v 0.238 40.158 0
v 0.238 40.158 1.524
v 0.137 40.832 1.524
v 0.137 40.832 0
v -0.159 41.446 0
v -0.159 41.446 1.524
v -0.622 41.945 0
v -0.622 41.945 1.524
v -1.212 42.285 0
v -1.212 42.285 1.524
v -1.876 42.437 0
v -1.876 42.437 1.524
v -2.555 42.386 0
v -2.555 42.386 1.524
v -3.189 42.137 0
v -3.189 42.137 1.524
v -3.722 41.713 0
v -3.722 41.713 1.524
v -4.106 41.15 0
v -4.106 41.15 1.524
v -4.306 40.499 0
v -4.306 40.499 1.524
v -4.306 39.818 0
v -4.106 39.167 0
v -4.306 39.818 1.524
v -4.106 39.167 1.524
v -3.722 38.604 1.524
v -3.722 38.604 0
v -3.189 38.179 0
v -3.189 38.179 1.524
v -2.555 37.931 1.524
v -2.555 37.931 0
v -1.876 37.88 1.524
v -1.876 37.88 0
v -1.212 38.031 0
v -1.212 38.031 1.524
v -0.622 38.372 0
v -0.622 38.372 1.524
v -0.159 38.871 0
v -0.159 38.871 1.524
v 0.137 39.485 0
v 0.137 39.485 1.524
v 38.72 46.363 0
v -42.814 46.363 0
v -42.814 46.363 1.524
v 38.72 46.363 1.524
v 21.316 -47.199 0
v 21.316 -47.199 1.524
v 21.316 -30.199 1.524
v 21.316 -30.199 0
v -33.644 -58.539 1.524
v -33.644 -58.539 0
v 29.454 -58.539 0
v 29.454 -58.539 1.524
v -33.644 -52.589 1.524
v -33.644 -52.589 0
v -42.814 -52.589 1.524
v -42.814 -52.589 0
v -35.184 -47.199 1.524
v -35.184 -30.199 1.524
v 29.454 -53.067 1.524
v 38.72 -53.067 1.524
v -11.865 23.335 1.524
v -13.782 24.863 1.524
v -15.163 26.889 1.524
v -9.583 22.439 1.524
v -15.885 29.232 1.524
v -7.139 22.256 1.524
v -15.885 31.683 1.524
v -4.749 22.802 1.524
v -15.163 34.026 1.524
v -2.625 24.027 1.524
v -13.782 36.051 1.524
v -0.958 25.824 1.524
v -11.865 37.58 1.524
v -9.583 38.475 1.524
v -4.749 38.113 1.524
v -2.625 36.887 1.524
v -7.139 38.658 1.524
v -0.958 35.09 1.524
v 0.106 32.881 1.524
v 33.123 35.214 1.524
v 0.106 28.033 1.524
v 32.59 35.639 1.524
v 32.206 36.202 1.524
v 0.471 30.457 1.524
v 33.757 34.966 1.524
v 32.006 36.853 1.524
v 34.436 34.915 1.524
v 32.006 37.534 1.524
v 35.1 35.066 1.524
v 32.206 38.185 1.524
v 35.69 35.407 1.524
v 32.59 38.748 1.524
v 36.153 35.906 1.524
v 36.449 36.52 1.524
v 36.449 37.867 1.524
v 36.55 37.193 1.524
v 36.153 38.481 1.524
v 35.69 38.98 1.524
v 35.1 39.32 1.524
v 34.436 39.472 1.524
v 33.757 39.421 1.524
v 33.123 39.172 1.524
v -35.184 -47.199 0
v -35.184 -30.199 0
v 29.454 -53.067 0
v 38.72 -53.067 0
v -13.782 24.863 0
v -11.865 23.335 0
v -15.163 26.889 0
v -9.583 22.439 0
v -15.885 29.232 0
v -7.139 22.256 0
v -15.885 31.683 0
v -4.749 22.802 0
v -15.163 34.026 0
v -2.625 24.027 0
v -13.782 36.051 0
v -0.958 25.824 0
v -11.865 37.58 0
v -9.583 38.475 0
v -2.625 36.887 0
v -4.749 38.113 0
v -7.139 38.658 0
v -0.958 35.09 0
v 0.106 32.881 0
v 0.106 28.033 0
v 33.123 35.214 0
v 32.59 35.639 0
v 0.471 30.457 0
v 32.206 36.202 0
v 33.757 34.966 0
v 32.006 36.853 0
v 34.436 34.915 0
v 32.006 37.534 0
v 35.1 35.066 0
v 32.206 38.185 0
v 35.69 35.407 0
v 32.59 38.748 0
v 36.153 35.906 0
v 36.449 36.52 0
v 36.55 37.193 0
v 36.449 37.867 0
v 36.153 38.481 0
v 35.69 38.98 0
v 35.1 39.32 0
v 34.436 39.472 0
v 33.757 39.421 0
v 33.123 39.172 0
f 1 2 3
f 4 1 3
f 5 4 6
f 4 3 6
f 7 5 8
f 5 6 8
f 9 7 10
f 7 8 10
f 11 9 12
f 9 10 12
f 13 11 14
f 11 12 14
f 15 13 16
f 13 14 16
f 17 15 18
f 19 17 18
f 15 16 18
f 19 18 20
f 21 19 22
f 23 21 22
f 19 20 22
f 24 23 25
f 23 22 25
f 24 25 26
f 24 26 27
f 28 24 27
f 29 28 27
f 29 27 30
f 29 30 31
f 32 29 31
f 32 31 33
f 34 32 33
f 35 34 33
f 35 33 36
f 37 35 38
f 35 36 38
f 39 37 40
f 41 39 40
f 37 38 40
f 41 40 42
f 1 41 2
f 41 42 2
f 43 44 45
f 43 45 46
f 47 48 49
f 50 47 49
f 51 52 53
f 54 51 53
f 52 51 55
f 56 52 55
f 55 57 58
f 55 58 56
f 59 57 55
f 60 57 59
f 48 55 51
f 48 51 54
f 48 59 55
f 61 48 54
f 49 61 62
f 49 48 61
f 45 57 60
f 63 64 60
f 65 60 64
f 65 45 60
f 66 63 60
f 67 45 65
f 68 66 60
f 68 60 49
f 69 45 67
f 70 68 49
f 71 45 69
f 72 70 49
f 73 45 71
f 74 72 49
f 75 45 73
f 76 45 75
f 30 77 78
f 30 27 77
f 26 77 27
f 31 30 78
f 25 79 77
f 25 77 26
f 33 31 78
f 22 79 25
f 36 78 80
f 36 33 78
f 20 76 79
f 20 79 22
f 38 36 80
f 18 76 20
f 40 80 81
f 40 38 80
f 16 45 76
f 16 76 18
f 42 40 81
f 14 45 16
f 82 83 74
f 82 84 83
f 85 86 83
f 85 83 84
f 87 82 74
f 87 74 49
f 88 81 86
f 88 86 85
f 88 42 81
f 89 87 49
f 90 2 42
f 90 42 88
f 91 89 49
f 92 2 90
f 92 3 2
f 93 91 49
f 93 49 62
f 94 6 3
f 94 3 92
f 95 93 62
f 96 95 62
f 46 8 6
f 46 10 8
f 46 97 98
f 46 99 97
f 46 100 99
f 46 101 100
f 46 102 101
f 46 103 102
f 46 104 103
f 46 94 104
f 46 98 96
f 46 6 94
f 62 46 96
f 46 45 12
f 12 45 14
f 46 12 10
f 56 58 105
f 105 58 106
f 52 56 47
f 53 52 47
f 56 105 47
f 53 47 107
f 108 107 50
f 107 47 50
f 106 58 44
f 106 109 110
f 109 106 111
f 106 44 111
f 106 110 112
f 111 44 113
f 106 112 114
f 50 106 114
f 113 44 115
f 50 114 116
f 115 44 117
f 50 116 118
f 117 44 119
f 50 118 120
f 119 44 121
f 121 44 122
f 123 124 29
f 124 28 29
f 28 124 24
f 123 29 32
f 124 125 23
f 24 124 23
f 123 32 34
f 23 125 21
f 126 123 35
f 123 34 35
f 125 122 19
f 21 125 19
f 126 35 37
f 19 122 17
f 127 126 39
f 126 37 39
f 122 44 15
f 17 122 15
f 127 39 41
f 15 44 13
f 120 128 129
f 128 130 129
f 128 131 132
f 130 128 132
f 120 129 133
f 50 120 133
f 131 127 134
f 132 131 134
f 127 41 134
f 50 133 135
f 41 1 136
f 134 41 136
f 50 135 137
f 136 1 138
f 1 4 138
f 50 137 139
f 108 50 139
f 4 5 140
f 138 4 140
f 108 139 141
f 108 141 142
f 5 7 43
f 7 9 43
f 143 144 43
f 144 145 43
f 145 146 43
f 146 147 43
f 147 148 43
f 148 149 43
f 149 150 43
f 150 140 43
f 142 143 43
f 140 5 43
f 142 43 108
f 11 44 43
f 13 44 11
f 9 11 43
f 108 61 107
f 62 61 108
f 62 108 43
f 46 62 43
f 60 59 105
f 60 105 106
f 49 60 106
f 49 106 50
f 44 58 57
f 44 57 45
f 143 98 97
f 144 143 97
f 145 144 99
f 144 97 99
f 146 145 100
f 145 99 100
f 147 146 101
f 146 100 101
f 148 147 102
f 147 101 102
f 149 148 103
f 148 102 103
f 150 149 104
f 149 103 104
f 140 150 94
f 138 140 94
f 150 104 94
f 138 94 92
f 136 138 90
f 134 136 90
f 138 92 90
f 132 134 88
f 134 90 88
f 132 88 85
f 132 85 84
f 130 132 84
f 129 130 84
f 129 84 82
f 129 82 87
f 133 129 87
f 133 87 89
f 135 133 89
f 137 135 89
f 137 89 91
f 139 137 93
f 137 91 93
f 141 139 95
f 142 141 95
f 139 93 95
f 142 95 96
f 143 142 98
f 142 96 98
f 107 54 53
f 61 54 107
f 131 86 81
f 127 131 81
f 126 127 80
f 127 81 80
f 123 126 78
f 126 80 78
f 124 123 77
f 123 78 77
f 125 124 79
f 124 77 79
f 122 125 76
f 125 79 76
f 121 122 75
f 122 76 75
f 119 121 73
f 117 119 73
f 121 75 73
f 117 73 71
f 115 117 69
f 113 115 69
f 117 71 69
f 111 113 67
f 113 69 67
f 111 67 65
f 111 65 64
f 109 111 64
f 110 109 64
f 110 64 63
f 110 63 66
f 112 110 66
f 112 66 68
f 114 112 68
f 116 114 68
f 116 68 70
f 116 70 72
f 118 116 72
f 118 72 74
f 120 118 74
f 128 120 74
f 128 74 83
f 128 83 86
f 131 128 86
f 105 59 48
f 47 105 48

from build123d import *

# Parameters (mm, degrees)
SKETCH1_W           = 81.534
SKETCH1_H           = 104.902
BOSS_EXTRUDE1_DEPTH = 1.524
SKETCH2_W           = 9.17
SKETCH2_H           = 5.95
SKETCH2_W_2         = 9.266089767
SKETCH2_H_2         = 5.472
CUT_EXTRUDE1_DEPTH  = 1.524
SKETCH4_W           = 56.5
SKETCH4_H           = 17
CUT_EXTRUDE2_DEPTH  = 1.524
SKETCH6_R           = 2.285
CUT_EXTRUDE3_DEPTH  = 1.524
SKETCH8_R           = 8.224077239
CUT_EXTRUDE4_DEPTH  = 2.54


with BuildPart() as part:
    # Sketch1 → Boss-Extrude1 (new body)
    with BuildSketch(Plane.XY):
        with Locations((-2.046973799, -6.087681223)):
            Rectangle(SKETCH1_W, SKETCH1_H)
    extrude(amount=BOSS_EXTRUDE1_DEPTH)

    # Sketch2 → Cut-Extrude1 (cut)
    with BuildSketch(Plane.XY.offset(1.524)):
        with Locations((-38.228973799, -55.563681223)):
            Rectangle(SKETCH2_W, SKETCH2_H)
        with Locations((34.086981318, -55.802681223)):
            Rectangle(SKETCH2_W_2, SKETCH2_H_2)
    extrude(amount=-CUT_EXTRUDE1_DEPTH, mode=Mode.SUBTRACT)

    # Sketch4 → Cut-Extrude2 (cut)
    with BuildSketch(Plane.XY.offset(1.524)):
        with Locations((-6.933973799, -38.698681223)):
            Rectangle(SKETCH4_W, SKETCH4_H)
    extrude(amount=-CUT_EXTRUDE2_DEPTH, mode=Mode.SUBTRACT)

    # Sketch6 → Cut-Extrude3 (cut)
    with BuildSketch(Plane.XY.offset(1.524)):
        with Locations((-2.046973799, 40.158318777)):
            Circle(SKETCH6_R)
        with Locations((34.265026201, 37.193318777)):
            Circle(SKETCH6_R)
    extrude(amount=-CUT_EXTRUDE3_DEPTH, mode=Mode.SUBTRACT)

    # Sketch8 → Cut-Extrude4 (cut)
    with BuildSketch(Plane.XY.offset(1.524)):
        with Locations((-7.753098943, 30.457244975)):
            Circle(SKETCH8_R)
    extrude(amount=-CUT_EXTRUDE4_DEPTH, mode=Mode.SUBTRACT)


solid = part.part
